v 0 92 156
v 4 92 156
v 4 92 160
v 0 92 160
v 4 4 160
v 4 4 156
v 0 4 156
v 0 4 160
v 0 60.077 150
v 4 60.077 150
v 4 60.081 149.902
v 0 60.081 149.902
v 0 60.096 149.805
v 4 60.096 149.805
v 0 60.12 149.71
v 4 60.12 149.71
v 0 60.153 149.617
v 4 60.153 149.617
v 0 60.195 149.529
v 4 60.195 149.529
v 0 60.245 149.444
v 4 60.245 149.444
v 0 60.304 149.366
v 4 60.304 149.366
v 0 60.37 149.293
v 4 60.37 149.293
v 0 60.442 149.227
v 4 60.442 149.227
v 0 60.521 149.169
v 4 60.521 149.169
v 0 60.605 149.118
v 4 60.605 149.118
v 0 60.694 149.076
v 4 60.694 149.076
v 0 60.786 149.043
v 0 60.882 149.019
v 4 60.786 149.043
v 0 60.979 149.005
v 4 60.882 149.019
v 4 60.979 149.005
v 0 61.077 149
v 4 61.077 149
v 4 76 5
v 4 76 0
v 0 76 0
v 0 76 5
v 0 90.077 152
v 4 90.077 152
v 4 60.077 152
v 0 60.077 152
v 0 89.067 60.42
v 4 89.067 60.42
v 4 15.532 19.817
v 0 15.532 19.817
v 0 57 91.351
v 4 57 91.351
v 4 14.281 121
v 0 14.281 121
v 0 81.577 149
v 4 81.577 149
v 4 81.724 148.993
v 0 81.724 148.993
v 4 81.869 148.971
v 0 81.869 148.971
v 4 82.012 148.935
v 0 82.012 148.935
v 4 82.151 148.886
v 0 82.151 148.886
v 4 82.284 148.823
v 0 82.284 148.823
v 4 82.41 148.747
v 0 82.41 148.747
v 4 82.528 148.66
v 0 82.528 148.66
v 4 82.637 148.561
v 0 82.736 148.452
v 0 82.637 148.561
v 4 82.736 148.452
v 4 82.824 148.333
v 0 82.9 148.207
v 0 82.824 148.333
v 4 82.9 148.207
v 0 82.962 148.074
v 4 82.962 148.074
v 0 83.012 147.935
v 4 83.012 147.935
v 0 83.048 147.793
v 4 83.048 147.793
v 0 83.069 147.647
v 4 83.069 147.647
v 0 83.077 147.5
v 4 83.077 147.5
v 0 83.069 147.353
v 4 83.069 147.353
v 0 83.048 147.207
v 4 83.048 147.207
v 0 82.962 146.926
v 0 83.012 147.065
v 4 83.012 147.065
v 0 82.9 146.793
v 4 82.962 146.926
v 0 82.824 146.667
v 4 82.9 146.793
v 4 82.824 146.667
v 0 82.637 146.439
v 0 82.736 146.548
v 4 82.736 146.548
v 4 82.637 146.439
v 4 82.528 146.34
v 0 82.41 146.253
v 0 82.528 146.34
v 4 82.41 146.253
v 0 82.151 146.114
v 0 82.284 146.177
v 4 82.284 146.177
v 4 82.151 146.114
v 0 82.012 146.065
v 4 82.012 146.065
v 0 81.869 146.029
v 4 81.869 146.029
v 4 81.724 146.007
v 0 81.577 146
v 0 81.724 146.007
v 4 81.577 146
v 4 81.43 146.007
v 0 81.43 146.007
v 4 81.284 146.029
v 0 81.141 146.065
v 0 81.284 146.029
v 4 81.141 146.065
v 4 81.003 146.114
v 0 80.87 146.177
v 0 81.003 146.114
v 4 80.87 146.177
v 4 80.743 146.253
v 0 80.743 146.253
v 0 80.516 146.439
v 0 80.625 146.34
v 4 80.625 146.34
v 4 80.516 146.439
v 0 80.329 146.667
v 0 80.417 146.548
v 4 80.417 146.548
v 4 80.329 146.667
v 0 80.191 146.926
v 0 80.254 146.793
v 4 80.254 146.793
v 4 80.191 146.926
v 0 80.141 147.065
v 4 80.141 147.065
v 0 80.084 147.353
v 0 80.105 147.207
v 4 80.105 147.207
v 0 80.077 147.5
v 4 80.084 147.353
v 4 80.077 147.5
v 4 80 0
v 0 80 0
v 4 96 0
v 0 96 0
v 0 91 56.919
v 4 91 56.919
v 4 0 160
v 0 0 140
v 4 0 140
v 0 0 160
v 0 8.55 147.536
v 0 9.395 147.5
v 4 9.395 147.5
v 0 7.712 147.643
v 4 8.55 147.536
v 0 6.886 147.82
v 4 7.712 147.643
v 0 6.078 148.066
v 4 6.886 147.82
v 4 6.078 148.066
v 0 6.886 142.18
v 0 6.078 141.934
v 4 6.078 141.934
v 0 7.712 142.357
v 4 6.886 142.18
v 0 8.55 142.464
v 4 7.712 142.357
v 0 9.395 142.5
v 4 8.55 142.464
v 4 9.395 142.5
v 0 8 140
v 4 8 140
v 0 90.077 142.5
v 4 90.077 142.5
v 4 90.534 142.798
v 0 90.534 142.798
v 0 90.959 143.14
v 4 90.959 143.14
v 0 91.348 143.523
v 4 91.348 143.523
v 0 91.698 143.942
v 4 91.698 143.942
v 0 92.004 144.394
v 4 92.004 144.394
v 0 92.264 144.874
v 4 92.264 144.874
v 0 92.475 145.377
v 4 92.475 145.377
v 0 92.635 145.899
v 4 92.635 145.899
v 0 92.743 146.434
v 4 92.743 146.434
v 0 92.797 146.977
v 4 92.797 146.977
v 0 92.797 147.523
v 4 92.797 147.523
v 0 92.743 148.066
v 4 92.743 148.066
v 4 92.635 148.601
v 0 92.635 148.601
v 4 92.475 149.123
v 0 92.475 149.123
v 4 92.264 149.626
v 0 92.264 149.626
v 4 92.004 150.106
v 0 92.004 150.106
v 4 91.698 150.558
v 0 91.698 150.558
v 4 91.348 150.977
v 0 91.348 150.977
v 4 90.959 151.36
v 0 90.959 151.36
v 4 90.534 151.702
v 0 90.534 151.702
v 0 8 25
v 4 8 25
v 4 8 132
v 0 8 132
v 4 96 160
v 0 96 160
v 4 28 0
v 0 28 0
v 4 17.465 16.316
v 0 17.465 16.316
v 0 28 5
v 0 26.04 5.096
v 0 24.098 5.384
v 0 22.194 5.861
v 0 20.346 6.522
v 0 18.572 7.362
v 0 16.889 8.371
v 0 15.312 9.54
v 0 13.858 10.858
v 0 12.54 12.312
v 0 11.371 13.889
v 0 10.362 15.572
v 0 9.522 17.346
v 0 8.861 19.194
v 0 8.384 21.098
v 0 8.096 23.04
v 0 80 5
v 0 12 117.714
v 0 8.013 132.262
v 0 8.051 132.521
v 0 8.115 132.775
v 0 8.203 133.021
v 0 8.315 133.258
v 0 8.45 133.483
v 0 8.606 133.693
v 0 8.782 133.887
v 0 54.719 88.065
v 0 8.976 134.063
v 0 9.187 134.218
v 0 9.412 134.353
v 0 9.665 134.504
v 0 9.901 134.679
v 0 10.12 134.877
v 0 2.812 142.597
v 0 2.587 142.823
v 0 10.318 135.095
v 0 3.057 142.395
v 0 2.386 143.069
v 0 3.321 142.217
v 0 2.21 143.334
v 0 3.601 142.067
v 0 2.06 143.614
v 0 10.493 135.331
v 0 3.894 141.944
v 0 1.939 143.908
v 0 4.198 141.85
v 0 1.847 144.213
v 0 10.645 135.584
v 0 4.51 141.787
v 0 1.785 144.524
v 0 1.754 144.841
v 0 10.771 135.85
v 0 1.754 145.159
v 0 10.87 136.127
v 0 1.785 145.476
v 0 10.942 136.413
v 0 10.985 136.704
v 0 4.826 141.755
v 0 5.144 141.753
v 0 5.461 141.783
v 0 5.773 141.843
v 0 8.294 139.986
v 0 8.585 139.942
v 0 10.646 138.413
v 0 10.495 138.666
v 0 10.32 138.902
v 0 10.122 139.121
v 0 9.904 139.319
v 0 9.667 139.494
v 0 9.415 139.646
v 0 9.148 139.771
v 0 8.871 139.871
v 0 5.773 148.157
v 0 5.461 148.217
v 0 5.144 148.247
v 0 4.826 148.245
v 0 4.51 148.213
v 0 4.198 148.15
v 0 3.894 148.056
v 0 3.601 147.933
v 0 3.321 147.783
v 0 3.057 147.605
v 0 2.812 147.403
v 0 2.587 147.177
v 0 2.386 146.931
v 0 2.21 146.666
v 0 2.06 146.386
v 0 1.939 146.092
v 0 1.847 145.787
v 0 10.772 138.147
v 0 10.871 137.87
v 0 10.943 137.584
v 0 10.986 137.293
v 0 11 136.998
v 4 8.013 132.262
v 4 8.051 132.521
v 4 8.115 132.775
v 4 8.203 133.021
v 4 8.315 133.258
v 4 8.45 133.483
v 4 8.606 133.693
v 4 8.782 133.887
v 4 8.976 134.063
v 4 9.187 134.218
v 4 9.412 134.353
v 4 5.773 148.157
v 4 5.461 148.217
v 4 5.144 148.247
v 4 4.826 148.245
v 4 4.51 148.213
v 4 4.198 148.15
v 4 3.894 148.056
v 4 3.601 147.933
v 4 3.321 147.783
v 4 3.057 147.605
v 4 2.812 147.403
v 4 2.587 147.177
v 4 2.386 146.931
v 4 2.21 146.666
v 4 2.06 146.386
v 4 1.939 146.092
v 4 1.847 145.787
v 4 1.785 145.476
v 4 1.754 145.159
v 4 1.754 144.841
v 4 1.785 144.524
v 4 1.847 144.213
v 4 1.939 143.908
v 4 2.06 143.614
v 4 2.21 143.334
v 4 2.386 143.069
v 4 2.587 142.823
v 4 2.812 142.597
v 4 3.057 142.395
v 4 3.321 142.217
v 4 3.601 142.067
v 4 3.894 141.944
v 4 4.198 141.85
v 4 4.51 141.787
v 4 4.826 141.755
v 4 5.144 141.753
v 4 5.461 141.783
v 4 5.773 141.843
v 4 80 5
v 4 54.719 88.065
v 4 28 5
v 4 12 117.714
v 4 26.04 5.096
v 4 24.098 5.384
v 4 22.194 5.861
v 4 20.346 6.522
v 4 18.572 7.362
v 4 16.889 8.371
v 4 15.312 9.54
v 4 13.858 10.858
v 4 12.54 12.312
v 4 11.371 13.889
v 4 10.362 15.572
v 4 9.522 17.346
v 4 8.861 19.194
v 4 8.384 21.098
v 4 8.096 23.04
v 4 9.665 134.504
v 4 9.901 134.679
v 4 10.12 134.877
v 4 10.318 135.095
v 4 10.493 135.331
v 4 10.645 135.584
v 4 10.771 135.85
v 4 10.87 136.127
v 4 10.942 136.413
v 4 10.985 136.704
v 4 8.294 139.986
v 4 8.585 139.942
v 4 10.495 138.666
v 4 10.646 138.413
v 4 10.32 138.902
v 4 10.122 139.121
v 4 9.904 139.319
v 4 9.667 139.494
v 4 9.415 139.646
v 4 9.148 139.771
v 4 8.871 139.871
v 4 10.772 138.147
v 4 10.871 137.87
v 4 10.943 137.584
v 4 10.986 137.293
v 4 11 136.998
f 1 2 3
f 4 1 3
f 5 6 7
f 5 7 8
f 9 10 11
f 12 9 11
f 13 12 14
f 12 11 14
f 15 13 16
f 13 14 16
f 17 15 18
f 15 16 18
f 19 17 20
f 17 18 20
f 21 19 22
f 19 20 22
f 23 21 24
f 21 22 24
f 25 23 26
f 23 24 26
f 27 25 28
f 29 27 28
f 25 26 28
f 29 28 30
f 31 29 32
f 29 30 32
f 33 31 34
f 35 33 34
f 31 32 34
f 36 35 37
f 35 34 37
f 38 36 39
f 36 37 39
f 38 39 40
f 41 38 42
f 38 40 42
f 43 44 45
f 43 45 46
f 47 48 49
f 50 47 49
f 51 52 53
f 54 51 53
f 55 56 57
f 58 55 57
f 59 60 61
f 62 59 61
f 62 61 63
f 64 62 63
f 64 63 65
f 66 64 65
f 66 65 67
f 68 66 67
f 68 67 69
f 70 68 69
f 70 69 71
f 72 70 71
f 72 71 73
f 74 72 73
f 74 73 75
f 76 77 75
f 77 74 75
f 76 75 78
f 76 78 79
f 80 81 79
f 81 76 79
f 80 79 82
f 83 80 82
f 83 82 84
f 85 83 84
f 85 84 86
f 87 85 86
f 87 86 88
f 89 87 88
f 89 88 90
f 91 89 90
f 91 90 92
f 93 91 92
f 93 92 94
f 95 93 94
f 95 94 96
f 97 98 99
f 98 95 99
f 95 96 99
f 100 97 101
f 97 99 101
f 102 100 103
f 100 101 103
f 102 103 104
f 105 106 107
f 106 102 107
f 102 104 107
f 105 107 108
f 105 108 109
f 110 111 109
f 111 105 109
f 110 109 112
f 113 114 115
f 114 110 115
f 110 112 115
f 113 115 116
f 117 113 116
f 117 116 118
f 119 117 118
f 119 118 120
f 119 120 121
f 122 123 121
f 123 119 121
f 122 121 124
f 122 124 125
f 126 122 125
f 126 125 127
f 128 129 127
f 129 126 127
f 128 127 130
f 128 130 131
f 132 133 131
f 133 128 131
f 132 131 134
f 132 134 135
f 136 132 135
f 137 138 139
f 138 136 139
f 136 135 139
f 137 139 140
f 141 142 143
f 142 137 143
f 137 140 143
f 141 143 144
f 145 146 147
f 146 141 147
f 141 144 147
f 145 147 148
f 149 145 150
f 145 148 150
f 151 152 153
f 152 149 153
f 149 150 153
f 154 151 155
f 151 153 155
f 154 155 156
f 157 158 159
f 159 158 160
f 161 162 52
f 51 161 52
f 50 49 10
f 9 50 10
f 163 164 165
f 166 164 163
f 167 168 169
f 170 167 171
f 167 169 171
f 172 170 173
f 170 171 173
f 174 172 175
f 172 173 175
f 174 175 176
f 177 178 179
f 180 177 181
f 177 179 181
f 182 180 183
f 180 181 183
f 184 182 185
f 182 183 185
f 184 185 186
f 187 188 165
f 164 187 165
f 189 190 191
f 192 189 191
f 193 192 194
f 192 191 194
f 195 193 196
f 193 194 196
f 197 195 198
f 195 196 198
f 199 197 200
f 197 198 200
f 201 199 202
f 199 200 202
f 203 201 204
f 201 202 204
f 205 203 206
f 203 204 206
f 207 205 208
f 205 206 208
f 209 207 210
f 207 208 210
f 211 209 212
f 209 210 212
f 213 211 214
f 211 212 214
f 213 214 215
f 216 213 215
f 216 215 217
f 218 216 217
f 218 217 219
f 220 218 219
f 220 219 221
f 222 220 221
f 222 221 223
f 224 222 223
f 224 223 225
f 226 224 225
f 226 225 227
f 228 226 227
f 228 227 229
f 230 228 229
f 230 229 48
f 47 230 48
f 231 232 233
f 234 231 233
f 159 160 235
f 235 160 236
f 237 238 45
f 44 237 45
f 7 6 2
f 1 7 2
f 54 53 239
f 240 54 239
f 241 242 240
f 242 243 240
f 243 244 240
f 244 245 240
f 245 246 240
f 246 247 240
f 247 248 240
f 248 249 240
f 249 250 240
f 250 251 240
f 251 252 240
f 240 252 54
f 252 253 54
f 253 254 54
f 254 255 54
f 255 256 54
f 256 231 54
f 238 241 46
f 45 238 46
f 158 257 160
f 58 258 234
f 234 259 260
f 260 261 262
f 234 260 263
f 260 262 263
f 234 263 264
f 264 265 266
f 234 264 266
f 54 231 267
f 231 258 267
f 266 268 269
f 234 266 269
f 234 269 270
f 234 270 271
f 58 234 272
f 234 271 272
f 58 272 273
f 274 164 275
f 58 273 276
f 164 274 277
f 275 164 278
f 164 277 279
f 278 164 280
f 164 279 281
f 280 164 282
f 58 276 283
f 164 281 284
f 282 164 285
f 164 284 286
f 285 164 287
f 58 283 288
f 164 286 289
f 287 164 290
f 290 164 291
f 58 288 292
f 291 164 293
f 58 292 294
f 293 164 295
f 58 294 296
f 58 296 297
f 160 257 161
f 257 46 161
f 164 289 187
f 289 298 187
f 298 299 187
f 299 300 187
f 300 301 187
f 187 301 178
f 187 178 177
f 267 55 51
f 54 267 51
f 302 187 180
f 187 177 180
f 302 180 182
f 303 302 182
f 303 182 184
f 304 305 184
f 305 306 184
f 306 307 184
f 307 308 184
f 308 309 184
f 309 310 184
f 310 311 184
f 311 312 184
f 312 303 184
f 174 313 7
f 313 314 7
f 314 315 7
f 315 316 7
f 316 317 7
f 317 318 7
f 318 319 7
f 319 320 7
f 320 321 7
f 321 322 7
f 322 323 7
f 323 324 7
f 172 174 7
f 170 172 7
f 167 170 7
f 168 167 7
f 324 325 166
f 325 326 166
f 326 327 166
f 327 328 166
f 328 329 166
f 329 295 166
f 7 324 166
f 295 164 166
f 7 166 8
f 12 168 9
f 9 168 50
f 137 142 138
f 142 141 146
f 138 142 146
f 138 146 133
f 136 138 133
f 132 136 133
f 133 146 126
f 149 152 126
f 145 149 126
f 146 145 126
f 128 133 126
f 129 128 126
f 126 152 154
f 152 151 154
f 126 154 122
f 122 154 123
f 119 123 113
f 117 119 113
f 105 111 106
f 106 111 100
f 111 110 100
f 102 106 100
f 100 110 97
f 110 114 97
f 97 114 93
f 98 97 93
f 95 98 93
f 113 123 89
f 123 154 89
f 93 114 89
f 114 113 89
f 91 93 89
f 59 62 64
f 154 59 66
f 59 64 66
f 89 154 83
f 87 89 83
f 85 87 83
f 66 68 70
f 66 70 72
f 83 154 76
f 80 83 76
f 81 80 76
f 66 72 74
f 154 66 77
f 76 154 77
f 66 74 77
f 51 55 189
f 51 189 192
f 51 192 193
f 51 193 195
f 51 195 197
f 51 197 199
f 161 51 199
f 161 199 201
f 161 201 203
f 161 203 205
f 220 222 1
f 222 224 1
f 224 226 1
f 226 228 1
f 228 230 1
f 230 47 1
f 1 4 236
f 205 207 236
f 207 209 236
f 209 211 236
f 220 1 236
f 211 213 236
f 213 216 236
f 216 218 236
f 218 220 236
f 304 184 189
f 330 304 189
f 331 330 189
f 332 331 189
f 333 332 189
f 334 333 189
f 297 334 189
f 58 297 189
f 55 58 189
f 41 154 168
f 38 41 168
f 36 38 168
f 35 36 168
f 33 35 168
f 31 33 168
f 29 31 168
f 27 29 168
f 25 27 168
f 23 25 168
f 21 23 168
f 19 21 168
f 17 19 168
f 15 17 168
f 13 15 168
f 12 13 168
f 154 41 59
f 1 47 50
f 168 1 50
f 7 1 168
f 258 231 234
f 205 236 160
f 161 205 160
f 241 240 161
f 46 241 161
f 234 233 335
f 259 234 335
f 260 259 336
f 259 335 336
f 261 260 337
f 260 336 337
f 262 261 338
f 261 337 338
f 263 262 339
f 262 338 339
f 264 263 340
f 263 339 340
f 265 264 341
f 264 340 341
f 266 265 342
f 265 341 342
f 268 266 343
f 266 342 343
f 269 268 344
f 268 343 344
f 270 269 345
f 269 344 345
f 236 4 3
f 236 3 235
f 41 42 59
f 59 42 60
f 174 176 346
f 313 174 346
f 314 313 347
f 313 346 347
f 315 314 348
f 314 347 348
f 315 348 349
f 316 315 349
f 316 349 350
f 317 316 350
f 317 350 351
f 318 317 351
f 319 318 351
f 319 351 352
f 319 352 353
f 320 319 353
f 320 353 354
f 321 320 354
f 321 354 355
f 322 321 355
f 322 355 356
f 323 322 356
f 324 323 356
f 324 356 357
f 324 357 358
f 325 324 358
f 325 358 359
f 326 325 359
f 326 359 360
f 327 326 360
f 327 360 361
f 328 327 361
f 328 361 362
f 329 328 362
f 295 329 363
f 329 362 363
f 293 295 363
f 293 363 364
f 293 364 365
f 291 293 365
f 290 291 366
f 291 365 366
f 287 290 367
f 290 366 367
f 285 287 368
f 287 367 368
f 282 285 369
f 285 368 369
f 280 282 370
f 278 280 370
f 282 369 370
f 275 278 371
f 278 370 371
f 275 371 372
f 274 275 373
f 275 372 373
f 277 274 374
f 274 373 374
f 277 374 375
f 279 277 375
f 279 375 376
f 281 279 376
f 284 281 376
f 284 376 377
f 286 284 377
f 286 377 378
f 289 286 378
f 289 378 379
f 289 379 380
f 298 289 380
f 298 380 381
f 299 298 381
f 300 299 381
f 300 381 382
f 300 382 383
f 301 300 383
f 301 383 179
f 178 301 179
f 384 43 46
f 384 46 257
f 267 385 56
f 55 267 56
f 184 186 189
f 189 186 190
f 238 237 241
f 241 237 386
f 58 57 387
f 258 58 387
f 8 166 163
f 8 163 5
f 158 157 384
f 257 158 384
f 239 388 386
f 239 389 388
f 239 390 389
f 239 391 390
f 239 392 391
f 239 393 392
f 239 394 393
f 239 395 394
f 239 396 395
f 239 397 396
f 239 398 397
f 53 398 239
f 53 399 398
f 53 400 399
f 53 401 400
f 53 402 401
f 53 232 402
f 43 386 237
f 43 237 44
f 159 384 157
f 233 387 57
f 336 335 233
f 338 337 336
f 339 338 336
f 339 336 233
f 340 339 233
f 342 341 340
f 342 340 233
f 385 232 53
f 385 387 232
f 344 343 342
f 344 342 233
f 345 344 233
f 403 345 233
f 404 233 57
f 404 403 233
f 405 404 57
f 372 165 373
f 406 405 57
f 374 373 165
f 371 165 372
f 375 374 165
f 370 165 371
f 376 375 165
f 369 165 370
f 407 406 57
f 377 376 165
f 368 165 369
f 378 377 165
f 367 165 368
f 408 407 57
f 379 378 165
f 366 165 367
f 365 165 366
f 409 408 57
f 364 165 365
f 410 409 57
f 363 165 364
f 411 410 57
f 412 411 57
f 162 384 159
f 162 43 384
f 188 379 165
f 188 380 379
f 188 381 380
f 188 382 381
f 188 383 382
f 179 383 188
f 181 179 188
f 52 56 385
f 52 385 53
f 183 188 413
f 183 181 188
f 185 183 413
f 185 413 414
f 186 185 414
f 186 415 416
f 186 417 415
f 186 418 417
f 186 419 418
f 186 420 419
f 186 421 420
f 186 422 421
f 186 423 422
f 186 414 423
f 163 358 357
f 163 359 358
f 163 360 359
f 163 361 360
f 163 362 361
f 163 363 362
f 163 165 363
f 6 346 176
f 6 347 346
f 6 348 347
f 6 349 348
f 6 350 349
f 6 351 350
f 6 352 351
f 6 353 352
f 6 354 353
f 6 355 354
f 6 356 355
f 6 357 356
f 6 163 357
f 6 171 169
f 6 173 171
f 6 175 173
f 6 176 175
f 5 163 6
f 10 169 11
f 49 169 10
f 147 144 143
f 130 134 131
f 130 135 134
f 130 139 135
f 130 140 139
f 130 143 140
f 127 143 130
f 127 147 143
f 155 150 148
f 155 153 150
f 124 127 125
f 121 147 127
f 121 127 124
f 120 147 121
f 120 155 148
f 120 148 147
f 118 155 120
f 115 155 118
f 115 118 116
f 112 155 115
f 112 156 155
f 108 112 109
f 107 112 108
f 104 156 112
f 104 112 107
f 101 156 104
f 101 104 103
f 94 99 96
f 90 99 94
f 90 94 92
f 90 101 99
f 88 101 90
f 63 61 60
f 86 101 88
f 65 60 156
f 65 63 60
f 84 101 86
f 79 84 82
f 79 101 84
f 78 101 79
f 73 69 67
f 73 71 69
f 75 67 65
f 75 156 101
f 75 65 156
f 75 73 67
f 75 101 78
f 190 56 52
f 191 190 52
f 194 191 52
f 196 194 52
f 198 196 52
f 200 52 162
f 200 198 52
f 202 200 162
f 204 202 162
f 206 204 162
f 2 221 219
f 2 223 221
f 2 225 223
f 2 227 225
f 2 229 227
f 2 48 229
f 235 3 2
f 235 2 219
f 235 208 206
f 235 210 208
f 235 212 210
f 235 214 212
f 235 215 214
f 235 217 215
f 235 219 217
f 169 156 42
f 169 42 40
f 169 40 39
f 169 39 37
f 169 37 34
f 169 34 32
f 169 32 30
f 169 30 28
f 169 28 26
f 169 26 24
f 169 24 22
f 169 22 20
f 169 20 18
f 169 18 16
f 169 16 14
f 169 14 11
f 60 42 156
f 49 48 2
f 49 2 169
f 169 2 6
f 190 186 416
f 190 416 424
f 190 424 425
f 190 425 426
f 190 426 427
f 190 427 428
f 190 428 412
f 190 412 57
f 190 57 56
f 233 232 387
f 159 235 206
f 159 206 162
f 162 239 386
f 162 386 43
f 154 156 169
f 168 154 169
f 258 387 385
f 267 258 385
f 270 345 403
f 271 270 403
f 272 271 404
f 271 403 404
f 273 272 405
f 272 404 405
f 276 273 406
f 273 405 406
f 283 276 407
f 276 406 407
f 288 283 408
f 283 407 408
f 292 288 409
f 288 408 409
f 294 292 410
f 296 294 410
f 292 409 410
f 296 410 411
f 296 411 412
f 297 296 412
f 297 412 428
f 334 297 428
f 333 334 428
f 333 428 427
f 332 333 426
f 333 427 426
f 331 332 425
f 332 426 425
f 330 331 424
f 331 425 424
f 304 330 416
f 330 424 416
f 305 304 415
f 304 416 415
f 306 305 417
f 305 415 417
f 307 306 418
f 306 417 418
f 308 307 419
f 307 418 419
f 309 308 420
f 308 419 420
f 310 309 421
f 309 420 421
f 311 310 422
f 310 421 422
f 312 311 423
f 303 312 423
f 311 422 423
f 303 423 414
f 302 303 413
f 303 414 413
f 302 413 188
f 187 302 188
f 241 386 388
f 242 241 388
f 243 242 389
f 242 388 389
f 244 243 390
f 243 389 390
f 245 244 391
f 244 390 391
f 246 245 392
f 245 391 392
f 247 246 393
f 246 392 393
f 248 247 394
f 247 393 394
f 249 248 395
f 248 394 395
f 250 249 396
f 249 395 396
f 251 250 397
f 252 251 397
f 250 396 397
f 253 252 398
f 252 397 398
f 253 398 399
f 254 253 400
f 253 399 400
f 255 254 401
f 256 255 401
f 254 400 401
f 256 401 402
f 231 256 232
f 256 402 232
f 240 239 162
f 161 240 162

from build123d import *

# Parameters (mm, degrees)
F0_W      = 96
F0_H      = 160
F1_DEPTH  = 4
F2_W      = 4
F2_H      = 5
F2_W_2    = 88
F2_H_2    = 4
F3_DEPTH  = 4
F5_DEPTH  = 4
F7_DEPTH  = 4
F9_DEPTH  = 4.001
F11_DEPTH = 4


with BuildPart() as f1:
    # F0 (on Right) → F1 (new body)
    with BuildSketch(Plane.YZ):
        with Locations((48, 80)):
            Rectangle(F0_W, F0_H)
    extrude(amount=F1_DEPTH)

    # F2 (on face) → F3 (cut, through all)
    with BuildSketch(Plane.YZ.offset(4)):
        with Locations((78, 2.5)):
            Rectangle(F2_W, F2_H)
        with Locations((48, 158)):
            Rectangle(F2_W_2, F2_H_2)
    extrude(amount=-F3_DEPTH, mode=Mode.SUBTRACT)

    # F4 (on face) → F5 (cut, through all)
    with BuildSketch(Plane.YZ.offset(4)):
        Polygon((54.719311, 88.064946), (57, 91.351046), (14.280689, 121), (12, 117.713899), align=None)
        Polygon((89.066517, 60.420493), (15.531596, 19.817348), (17.465079, 16.315685), (91, 56.91883), align=None)
    extrude(amount=-F5_DEPTH, mode=Mode.SUBTRACT)

    # F6 (on face) → F7 (cut, through all)
    with BuildSketch(Plane.YZ.offset(4)):
        with BuildLine():
            Line((0, 140), (0, 0))
            Line((0, 0), (28, 0))
            Line((28, 0), (28, 5))
            ThreePointArc((28, 5), (13.857864, 10.857864), (8, 25))
            Line((8, 25), (8, 140))
            Line((8, 140), (0, 140))
        make_face()
    extrude(amount=-F7_DEPTH, mode=Mode.SUBTRACT)

    # F8 (on face) → F9 (cut, through all)
    with BuildSketch(Plane.YZ.offset(4)):
        with BuildLine():
            ThreePointArc((6.07792, 141.933962), (7.712282, 142.357475), (9.394599, 142.5))
            Line((9.394599, 142.5), (90.076656, 142.5))
            ThreePointArc((90.076656, 142.5), (92.804022, 147.25), (90.076656, 152))
            Line((90.076656, 152), (60.076656, 152))
            Line((60.076656, 152), (60.076656, 150))
            ThreePointArc((60.076656, 150), (60.369549, 149.292893), (61.076656, 149))
            Line((61.076656, 149), (81.576656, 149))
            ThreePointArc((81.576656, 149), (82.637316, 146.43934), (80.076656, 147.5))
            Line((80.076656, 147.5), (9.394599, 147.5))
            ThreePointArc((9.394599, 147.5), (7.712282, 147.642525), (6.07792, 148.066038))
            ThreePointArc((6.07792, 148.066038), (1.75, 145), (6.07792, 141.933962))
        make_face()
    extrude(amount=-F9_DEPTH, mode=Mode.SUBTRACT)

    # F10 (on face) → F11 (cut, through all)
    with BuildSketch(Plane.YZ.offset(4)):
        with BuildLine():
            ThreePointArc((9.411765, 134.352941), (10.910428, 137.727607), (8, 140))
            Line((8, 140), (8, 132))
            ThreePointArc((8, 132), (8.380019, 133.371989), (9.411765, 134.352941))
        make_face()
    extrude(amount=-F11_DEPTH, mode=Mode.SUBTRACT)


solid = f1.part
